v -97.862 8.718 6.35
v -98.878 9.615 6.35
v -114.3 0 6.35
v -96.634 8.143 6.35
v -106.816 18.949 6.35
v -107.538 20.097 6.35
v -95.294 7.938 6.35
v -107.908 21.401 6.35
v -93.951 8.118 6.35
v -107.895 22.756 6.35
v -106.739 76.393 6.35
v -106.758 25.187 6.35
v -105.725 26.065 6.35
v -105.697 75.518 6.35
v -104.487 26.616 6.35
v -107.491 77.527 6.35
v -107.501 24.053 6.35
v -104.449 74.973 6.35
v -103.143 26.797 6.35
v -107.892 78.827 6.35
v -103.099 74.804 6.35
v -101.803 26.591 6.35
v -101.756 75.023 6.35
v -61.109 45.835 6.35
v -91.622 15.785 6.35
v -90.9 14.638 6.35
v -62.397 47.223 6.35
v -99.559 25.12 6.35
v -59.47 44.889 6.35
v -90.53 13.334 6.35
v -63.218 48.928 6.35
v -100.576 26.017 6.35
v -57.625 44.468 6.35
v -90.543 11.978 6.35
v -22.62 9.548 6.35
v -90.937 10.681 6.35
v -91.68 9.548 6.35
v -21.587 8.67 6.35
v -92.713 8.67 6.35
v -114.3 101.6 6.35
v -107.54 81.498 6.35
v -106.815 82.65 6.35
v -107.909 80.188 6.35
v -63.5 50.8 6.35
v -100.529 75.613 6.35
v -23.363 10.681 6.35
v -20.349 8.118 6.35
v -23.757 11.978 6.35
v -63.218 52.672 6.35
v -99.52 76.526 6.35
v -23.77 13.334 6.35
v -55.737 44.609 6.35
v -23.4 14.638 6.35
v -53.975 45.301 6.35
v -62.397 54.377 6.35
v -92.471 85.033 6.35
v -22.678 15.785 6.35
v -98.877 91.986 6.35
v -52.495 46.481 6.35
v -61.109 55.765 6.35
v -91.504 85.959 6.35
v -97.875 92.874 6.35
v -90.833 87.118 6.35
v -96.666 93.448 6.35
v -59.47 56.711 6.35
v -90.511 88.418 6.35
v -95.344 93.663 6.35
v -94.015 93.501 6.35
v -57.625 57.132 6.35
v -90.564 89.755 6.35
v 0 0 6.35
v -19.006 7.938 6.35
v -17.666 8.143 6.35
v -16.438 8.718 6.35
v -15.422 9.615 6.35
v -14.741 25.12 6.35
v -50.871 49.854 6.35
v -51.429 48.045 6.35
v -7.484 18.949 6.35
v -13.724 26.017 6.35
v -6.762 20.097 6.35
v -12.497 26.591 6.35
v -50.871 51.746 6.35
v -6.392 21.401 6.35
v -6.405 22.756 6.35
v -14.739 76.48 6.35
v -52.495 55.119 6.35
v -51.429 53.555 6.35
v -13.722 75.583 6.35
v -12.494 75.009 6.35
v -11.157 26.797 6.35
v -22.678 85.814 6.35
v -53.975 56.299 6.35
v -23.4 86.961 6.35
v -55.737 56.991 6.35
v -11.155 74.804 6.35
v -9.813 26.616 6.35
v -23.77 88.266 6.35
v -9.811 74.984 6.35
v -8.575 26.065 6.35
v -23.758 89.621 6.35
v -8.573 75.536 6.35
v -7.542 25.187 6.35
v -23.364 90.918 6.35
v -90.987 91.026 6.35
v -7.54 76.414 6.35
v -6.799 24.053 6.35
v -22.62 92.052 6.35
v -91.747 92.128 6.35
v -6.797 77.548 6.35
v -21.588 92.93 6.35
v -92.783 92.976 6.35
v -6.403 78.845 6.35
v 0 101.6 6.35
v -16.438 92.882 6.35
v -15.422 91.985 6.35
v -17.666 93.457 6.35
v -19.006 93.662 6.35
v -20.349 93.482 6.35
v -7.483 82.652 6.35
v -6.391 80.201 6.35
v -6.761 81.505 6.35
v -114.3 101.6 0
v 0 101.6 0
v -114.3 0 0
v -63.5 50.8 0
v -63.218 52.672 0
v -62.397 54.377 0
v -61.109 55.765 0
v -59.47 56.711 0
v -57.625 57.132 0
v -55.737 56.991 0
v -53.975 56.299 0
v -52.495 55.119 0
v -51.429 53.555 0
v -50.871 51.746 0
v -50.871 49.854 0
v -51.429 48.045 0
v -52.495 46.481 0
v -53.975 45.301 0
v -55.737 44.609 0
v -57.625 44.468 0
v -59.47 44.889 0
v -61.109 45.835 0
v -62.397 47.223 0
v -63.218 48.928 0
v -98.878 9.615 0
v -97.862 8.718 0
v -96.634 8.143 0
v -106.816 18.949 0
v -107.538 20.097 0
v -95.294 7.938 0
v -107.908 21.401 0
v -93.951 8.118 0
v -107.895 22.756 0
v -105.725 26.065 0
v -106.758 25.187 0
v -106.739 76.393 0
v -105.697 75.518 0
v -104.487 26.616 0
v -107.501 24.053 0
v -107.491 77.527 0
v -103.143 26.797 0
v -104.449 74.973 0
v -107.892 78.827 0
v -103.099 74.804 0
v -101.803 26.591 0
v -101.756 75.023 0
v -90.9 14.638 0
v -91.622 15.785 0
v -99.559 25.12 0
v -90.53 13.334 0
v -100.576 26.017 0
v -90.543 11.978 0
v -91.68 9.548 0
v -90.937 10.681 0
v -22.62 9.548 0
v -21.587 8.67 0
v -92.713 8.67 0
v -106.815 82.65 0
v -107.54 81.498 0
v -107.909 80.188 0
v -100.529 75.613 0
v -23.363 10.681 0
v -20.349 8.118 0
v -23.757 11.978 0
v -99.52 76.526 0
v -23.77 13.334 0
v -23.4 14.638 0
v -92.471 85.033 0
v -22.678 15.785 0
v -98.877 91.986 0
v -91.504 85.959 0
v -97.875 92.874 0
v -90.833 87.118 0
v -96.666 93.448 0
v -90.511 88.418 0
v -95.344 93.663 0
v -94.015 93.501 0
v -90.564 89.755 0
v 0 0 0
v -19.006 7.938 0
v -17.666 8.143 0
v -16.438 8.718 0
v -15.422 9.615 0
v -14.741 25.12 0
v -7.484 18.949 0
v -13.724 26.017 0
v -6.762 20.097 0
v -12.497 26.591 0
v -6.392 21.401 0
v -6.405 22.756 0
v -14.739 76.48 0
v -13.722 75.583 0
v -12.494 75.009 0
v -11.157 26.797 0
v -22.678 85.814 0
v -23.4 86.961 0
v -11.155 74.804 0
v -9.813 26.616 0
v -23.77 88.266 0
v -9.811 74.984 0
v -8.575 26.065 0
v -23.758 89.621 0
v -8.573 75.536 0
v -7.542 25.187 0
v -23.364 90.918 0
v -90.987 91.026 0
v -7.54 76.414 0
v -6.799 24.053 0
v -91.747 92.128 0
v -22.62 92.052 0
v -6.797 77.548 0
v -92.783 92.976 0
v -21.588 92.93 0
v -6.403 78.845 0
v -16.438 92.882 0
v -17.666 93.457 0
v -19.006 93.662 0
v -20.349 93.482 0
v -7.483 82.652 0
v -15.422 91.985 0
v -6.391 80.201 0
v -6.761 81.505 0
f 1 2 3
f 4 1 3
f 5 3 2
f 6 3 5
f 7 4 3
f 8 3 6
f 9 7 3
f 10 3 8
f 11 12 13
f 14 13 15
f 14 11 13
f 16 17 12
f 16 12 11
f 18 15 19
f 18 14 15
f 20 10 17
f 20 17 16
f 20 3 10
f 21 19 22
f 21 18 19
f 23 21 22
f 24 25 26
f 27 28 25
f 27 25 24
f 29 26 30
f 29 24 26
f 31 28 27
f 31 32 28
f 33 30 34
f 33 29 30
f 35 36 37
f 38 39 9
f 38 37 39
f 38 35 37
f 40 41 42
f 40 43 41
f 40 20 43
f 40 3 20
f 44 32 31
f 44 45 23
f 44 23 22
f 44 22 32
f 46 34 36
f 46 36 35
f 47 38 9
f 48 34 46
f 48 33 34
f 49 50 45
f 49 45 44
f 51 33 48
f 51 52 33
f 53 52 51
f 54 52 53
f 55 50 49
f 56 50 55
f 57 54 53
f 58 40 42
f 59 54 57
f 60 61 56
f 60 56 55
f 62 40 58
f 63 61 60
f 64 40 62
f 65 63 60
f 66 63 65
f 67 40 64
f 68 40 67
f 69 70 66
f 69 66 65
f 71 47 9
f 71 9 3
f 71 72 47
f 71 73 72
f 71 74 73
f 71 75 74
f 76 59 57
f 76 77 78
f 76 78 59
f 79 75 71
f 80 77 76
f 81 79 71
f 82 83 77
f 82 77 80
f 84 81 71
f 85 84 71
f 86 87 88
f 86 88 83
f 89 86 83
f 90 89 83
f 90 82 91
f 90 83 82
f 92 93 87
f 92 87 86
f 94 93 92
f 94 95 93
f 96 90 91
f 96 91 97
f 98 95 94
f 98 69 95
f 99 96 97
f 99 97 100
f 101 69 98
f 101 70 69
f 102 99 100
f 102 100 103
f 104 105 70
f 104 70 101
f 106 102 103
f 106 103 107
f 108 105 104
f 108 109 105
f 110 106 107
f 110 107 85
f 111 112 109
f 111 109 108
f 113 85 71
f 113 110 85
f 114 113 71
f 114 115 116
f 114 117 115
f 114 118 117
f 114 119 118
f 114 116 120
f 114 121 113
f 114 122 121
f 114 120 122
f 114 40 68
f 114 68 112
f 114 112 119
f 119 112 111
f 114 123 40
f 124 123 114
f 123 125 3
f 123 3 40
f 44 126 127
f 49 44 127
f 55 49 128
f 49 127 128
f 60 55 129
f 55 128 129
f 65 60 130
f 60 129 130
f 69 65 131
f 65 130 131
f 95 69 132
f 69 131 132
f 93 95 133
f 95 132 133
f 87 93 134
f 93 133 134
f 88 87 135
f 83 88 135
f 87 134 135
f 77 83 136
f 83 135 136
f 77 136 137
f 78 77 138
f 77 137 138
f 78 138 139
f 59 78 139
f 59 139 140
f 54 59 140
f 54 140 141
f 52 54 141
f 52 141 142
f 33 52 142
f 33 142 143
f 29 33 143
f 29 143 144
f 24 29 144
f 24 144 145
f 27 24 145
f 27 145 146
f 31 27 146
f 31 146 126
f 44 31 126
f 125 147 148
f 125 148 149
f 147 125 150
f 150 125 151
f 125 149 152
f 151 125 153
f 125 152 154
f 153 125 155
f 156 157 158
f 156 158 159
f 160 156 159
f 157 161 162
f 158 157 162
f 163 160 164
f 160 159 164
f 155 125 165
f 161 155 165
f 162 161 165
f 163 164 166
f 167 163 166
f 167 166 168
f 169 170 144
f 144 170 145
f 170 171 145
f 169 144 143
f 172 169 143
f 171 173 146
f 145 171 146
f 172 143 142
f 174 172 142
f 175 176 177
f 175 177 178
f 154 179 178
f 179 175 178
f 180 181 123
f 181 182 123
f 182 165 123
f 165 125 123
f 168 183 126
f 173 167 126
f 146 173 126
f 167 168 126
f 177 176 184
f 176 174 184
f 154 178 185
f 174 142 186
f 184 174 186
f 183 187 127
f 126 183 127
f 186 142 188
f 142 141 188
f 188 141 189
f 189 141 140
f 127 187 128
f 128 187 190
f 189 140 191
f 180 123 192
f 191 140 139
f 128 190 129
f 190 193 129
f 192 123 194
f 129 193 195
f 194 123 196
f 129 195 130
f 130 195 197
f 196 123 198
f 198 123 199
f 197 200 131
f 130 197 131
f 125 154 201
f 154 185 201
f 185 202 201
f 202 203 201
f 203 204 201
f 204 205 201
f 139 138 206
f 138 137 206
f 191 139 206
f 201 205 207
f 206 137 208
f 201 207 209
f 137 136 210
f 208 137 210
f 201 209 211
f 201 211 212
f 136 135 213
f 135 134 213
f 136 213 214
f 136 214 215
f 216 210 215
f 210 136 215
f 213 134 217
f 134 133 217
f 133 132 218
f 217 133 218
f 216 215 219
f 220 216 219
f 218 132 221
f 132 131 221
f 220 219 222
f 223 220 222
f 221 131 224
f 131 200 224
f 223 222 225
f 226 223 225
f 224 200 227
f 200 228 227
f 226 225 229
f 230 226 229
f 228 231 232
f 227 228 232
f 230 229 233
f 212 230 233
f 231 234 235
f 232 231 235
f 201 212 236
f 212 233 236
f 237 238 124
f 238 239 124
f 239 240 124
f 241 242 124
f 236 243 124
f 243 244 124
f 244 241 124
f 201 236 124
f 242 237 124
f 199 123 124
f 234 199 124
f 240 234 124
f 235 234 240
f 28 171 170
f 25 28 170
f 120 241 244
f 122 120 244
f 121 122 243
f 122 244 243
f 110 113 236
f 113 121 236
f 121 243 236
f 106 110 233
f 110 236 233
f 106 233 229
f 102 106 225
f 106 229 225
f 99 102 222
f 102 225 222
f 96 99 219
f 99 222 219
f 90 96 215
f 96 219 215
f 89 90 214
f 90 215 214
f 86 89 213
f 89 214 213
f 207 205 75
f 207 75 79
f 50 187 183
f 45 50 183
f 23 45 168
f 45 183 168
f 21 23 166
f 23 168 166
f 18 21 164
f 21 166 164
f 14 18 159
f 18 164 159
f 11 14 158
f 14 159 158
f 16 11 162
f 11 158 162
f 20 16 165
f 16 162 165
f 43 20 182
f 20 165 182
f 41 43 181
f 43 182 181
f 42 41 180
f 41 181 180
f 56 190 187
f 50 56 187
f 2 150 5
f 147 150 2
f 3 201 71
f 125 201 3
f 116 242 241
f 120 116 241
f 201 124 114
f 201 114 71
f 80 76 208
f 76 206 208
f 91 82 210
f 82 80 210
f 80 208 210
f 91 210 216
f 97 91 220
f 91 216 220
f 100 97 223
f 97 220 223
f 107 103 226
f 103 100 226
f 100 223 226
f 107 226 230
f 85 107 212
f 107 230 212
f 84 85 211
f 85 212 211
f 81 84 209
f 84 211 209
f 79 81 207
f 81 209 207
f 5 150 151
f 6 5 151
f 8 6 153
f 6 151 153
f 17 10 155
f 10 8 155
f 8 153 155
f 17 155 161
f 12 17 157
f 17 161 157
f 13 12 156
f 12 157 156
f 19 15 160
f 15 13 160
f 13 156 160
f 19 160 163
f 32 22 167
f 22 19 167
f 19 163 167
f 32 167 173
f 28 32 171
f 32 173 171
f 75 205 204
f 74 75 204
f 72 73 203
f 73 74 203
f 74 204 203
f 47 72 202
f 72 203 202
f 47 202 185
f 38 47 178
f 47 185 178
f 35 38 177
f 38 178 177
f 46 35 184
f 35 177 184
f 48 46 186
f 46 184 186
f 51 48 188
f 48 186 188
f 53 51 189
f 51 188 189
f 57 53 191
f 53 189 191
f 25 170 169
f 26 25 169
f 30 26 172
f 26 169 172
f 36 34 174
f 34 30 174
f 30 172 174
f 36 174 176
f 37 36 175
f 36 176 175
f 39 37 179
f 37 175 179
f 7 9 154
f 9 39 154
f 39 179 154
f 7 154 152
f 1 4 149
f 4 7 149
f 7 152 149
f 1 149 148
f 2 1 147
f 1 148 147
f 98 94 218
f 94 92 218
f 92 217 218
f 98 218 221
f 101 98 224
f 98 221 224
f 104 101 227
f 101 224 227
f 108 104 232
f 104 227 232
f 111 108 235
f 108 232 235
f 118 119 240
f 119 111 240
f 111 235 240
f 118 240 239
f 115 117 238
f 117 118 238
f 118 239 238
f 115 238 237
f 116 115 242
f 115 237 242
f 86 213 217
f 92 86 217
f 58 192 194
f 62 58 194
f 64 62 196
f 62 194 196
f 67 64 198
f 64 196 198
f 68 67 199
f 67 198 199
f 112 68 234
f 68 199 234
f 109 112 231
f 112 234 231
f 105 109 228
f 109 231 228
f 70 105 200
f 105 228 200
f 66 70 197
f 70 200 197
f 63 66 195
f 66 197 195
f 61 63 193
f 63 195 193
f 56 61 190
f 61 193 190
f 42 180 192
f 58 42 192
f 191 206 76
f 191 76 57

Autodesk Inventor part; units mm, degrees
ref_plane "YZ Plane" through (0, 0, 0) normal (1, 0, 0) x (0, 1, 0)
ref_plane "XZ Plane" through (0, 0, 0) normal (0, 1, 0) x (-1, 0, 0)
ref_plane "XY Plane" through (0, 0, 0) normal (0, 0, 1) x (1, 0, 0)
sketch "Sketch1" plane through (0, 0, 0) normal (0, 0, 1) x (1, 0, 0)
  line L0 (0, 0) -> (-114.3, 0)
  line L1 (-114.3, 0) -> (-114.3, 101.6)
  line L2 (-114.3, 101.6) -> (0, 101.6)
  line L3 (0, 101.6) -> (0, 0)
  line L4 (0, 50.8) -> (0, 12.7)
  line L5 (0, 50.8) -> (0, 88.9)
  line L6 (-114.3, 50.8) -> (-114.3, 88.9)
  line L7 (-114.3, 50.8) -> (-114.3, 12.7)
  arc A0 (-92.4707, 85.033) -> (-98.8773, 91.9861) centre (-95.2491, 88.9011) ccw
  arc A1 (-15.4219, 91.9851) -> (-22.6777, 85.8144) centre (-19.05, 88.9) ccw
  arc A2 (-98.8781, 9.6149) -> (-91.6219, 15.7851) centre (-95.25, 12.7) ccw
  arc A3 (-22.6781, 15.7851) -> (-15.4219, 9.6149) centre (-19.05, 12.7) ccw
  line L8 (-57.15, 0) -> (-103.1875, 0)
  line L9 (-57.15, 0) -> (-11.1125, 0)
  line L10 (-57.15, 101.6) -> (-103.1875, 101.6)
  line L11 (-57.15, 101.6) -> (-11.1125, 101.6)
  arc A4 (-99.5594, 25.1196) -> (-106.8156, 18.9494) centre (-103.1875, 22.0345) ccw
  arc A5 (-7.4844, 18.9494) -> (-14.7406, 25.1196) centre (-11.1125, 22.0345) ccw
  arc A6 (-106.8154, 82.6503) -> (-99.5202, 76.5264) centre (-103.1872, 79.5653) ccw
  arc A7 (-14.7386, 76.4804) -> (-7.4832, 82.6517) centre (-11.1109, 79.5661) ccw
  line L12 (-90.9324, 86.8892) -> (-99.5202, 76.5264)
  line L13 (-106.8154, 82.6503) -> (-98.8773, 91.9861)
  line L14 (-15.4227, 91.9861) -> (-7.4832, 82.6517)
  line L15 (-14.7386, 76.4804) -> (-22.6777, 85.8144)
  line L16 (-14.7406, 25.1196) -> (-22.6781, 15.7851)
  line L17 (-15.4219, 9.6149) -> (-7.4844, 18.9494)
  line L18 (-99.5594, 25.1196) -> (-91.6219, 15.7851)
  line L19 (-106.8156, 18.9494) -> (-98.8781, 9.6149)
  dimension "d0" = 114.3
  dimension "d1" = 101.6
  dimension "d8" = 9.525
  dimension "d9" = 9.525
  dimension "d10" = 9.525
  dimension "d11" = 46.0375
  dimension "d14" = 46.0375
  dimension "d16" = 9.525
  dimension "d20" = 9.525
  dimension "d22" = 9.525
extrude "Extrusion1" add sketch "Sketch1" along normal blind 6.35
sketch "Sketch2" plane through (0, 0, 0) normal (0, 0, -1) x (-1, 0, 0)
  line L0 (0, 101.6) -> (114.3, 101.6) projected
  line L1 (0, 101.6) -> (57.15, 101.6)
  line L2 (57.15, 101.6) -> (57.15, 50.8)
  circle A0 centre (57.15, 50.8) radius 6.35
  dimension "d25" = 12.7
extrude "Extrusion2" cut sketch "Sketch2" against normal blind 6.35
properties part number "wheel mount plate"
